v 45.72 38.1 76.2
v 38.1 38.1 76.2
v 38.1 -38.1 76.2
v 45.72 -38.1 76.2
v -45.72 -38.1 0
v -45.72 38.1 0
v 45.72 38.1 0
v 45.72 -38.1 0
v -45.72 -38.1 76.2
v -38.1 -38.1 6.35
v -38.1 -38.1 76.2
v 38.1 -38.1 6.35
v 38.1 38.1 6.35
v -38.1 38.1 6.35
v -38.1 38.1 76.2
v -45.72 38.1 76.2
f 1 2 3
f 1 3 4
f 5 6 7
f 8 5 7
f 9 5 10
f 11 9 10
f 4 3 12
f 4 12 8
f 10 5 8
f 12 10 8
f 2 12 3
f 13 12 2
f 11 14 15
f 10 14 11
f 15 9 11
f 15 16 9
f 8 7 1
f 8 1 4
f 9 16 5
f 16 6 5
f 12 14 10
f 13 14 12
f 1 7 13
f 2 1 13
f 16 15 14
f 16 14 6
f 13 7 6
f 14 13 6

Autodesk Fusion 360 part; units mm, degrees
sketch "Sketch1" plane through (0, 0, 0) normal (0, 0, 1) x (1, 0, 0)
  line L0 (38.1, 38.1) -> (-38.1, 38.1)
  line L1 (-38.1, 38.1) -> (-38.1, -38.1)
  line L2 (-38.1, -38.1) -> (38.1, -38.1)
  line L3 (38.1, -38.1) -> (38.1, 38.1)
  line L4 (38.1, 38.1) -> (-38.1, -38.1) construction
  line L5 (-38.1, 38.1) -> (38.1, -38.1) construction
  line L6 (-38.1, 38.1) -> (-45.72, 38.1)
  line L7 (-45.72, 38.1) -> (-45.72, -38.1)
  line L8 (-45.72, -38.1) -> (-38.1, -38.1)
  line L9 (-38.1, -38.1) -> (-38.1, 38.1)
  line L10 (38.1, 38.1) -> (45.72, 38.1)
  line L11 (45.72, 38.1) -> (45.72, -38.1)
  line L12 (45.72, -38.1) -> (38.1, -38.1)
  line L13 (38.1, -38.1) -> (38.1, 38.1)
  dimension "d1" = 76.2
  dimension "d2" = 76.2
  dimension "d3" = 7.62
extrude "Extrude1" add sketch "Sketch1" along normal blind 6.35 contours L0 L1 L2 L3 L9 L13
sketch "Sketch2" plane through (0, 0, 0) normal (0, 0, 1) x (1, 0, 0)
extrude "Extrude2" add sketch "Sketch1" along normal blind 76.2 contours L3 L10 L11 L12 L13 | L1 L6 L7 L8 L9
